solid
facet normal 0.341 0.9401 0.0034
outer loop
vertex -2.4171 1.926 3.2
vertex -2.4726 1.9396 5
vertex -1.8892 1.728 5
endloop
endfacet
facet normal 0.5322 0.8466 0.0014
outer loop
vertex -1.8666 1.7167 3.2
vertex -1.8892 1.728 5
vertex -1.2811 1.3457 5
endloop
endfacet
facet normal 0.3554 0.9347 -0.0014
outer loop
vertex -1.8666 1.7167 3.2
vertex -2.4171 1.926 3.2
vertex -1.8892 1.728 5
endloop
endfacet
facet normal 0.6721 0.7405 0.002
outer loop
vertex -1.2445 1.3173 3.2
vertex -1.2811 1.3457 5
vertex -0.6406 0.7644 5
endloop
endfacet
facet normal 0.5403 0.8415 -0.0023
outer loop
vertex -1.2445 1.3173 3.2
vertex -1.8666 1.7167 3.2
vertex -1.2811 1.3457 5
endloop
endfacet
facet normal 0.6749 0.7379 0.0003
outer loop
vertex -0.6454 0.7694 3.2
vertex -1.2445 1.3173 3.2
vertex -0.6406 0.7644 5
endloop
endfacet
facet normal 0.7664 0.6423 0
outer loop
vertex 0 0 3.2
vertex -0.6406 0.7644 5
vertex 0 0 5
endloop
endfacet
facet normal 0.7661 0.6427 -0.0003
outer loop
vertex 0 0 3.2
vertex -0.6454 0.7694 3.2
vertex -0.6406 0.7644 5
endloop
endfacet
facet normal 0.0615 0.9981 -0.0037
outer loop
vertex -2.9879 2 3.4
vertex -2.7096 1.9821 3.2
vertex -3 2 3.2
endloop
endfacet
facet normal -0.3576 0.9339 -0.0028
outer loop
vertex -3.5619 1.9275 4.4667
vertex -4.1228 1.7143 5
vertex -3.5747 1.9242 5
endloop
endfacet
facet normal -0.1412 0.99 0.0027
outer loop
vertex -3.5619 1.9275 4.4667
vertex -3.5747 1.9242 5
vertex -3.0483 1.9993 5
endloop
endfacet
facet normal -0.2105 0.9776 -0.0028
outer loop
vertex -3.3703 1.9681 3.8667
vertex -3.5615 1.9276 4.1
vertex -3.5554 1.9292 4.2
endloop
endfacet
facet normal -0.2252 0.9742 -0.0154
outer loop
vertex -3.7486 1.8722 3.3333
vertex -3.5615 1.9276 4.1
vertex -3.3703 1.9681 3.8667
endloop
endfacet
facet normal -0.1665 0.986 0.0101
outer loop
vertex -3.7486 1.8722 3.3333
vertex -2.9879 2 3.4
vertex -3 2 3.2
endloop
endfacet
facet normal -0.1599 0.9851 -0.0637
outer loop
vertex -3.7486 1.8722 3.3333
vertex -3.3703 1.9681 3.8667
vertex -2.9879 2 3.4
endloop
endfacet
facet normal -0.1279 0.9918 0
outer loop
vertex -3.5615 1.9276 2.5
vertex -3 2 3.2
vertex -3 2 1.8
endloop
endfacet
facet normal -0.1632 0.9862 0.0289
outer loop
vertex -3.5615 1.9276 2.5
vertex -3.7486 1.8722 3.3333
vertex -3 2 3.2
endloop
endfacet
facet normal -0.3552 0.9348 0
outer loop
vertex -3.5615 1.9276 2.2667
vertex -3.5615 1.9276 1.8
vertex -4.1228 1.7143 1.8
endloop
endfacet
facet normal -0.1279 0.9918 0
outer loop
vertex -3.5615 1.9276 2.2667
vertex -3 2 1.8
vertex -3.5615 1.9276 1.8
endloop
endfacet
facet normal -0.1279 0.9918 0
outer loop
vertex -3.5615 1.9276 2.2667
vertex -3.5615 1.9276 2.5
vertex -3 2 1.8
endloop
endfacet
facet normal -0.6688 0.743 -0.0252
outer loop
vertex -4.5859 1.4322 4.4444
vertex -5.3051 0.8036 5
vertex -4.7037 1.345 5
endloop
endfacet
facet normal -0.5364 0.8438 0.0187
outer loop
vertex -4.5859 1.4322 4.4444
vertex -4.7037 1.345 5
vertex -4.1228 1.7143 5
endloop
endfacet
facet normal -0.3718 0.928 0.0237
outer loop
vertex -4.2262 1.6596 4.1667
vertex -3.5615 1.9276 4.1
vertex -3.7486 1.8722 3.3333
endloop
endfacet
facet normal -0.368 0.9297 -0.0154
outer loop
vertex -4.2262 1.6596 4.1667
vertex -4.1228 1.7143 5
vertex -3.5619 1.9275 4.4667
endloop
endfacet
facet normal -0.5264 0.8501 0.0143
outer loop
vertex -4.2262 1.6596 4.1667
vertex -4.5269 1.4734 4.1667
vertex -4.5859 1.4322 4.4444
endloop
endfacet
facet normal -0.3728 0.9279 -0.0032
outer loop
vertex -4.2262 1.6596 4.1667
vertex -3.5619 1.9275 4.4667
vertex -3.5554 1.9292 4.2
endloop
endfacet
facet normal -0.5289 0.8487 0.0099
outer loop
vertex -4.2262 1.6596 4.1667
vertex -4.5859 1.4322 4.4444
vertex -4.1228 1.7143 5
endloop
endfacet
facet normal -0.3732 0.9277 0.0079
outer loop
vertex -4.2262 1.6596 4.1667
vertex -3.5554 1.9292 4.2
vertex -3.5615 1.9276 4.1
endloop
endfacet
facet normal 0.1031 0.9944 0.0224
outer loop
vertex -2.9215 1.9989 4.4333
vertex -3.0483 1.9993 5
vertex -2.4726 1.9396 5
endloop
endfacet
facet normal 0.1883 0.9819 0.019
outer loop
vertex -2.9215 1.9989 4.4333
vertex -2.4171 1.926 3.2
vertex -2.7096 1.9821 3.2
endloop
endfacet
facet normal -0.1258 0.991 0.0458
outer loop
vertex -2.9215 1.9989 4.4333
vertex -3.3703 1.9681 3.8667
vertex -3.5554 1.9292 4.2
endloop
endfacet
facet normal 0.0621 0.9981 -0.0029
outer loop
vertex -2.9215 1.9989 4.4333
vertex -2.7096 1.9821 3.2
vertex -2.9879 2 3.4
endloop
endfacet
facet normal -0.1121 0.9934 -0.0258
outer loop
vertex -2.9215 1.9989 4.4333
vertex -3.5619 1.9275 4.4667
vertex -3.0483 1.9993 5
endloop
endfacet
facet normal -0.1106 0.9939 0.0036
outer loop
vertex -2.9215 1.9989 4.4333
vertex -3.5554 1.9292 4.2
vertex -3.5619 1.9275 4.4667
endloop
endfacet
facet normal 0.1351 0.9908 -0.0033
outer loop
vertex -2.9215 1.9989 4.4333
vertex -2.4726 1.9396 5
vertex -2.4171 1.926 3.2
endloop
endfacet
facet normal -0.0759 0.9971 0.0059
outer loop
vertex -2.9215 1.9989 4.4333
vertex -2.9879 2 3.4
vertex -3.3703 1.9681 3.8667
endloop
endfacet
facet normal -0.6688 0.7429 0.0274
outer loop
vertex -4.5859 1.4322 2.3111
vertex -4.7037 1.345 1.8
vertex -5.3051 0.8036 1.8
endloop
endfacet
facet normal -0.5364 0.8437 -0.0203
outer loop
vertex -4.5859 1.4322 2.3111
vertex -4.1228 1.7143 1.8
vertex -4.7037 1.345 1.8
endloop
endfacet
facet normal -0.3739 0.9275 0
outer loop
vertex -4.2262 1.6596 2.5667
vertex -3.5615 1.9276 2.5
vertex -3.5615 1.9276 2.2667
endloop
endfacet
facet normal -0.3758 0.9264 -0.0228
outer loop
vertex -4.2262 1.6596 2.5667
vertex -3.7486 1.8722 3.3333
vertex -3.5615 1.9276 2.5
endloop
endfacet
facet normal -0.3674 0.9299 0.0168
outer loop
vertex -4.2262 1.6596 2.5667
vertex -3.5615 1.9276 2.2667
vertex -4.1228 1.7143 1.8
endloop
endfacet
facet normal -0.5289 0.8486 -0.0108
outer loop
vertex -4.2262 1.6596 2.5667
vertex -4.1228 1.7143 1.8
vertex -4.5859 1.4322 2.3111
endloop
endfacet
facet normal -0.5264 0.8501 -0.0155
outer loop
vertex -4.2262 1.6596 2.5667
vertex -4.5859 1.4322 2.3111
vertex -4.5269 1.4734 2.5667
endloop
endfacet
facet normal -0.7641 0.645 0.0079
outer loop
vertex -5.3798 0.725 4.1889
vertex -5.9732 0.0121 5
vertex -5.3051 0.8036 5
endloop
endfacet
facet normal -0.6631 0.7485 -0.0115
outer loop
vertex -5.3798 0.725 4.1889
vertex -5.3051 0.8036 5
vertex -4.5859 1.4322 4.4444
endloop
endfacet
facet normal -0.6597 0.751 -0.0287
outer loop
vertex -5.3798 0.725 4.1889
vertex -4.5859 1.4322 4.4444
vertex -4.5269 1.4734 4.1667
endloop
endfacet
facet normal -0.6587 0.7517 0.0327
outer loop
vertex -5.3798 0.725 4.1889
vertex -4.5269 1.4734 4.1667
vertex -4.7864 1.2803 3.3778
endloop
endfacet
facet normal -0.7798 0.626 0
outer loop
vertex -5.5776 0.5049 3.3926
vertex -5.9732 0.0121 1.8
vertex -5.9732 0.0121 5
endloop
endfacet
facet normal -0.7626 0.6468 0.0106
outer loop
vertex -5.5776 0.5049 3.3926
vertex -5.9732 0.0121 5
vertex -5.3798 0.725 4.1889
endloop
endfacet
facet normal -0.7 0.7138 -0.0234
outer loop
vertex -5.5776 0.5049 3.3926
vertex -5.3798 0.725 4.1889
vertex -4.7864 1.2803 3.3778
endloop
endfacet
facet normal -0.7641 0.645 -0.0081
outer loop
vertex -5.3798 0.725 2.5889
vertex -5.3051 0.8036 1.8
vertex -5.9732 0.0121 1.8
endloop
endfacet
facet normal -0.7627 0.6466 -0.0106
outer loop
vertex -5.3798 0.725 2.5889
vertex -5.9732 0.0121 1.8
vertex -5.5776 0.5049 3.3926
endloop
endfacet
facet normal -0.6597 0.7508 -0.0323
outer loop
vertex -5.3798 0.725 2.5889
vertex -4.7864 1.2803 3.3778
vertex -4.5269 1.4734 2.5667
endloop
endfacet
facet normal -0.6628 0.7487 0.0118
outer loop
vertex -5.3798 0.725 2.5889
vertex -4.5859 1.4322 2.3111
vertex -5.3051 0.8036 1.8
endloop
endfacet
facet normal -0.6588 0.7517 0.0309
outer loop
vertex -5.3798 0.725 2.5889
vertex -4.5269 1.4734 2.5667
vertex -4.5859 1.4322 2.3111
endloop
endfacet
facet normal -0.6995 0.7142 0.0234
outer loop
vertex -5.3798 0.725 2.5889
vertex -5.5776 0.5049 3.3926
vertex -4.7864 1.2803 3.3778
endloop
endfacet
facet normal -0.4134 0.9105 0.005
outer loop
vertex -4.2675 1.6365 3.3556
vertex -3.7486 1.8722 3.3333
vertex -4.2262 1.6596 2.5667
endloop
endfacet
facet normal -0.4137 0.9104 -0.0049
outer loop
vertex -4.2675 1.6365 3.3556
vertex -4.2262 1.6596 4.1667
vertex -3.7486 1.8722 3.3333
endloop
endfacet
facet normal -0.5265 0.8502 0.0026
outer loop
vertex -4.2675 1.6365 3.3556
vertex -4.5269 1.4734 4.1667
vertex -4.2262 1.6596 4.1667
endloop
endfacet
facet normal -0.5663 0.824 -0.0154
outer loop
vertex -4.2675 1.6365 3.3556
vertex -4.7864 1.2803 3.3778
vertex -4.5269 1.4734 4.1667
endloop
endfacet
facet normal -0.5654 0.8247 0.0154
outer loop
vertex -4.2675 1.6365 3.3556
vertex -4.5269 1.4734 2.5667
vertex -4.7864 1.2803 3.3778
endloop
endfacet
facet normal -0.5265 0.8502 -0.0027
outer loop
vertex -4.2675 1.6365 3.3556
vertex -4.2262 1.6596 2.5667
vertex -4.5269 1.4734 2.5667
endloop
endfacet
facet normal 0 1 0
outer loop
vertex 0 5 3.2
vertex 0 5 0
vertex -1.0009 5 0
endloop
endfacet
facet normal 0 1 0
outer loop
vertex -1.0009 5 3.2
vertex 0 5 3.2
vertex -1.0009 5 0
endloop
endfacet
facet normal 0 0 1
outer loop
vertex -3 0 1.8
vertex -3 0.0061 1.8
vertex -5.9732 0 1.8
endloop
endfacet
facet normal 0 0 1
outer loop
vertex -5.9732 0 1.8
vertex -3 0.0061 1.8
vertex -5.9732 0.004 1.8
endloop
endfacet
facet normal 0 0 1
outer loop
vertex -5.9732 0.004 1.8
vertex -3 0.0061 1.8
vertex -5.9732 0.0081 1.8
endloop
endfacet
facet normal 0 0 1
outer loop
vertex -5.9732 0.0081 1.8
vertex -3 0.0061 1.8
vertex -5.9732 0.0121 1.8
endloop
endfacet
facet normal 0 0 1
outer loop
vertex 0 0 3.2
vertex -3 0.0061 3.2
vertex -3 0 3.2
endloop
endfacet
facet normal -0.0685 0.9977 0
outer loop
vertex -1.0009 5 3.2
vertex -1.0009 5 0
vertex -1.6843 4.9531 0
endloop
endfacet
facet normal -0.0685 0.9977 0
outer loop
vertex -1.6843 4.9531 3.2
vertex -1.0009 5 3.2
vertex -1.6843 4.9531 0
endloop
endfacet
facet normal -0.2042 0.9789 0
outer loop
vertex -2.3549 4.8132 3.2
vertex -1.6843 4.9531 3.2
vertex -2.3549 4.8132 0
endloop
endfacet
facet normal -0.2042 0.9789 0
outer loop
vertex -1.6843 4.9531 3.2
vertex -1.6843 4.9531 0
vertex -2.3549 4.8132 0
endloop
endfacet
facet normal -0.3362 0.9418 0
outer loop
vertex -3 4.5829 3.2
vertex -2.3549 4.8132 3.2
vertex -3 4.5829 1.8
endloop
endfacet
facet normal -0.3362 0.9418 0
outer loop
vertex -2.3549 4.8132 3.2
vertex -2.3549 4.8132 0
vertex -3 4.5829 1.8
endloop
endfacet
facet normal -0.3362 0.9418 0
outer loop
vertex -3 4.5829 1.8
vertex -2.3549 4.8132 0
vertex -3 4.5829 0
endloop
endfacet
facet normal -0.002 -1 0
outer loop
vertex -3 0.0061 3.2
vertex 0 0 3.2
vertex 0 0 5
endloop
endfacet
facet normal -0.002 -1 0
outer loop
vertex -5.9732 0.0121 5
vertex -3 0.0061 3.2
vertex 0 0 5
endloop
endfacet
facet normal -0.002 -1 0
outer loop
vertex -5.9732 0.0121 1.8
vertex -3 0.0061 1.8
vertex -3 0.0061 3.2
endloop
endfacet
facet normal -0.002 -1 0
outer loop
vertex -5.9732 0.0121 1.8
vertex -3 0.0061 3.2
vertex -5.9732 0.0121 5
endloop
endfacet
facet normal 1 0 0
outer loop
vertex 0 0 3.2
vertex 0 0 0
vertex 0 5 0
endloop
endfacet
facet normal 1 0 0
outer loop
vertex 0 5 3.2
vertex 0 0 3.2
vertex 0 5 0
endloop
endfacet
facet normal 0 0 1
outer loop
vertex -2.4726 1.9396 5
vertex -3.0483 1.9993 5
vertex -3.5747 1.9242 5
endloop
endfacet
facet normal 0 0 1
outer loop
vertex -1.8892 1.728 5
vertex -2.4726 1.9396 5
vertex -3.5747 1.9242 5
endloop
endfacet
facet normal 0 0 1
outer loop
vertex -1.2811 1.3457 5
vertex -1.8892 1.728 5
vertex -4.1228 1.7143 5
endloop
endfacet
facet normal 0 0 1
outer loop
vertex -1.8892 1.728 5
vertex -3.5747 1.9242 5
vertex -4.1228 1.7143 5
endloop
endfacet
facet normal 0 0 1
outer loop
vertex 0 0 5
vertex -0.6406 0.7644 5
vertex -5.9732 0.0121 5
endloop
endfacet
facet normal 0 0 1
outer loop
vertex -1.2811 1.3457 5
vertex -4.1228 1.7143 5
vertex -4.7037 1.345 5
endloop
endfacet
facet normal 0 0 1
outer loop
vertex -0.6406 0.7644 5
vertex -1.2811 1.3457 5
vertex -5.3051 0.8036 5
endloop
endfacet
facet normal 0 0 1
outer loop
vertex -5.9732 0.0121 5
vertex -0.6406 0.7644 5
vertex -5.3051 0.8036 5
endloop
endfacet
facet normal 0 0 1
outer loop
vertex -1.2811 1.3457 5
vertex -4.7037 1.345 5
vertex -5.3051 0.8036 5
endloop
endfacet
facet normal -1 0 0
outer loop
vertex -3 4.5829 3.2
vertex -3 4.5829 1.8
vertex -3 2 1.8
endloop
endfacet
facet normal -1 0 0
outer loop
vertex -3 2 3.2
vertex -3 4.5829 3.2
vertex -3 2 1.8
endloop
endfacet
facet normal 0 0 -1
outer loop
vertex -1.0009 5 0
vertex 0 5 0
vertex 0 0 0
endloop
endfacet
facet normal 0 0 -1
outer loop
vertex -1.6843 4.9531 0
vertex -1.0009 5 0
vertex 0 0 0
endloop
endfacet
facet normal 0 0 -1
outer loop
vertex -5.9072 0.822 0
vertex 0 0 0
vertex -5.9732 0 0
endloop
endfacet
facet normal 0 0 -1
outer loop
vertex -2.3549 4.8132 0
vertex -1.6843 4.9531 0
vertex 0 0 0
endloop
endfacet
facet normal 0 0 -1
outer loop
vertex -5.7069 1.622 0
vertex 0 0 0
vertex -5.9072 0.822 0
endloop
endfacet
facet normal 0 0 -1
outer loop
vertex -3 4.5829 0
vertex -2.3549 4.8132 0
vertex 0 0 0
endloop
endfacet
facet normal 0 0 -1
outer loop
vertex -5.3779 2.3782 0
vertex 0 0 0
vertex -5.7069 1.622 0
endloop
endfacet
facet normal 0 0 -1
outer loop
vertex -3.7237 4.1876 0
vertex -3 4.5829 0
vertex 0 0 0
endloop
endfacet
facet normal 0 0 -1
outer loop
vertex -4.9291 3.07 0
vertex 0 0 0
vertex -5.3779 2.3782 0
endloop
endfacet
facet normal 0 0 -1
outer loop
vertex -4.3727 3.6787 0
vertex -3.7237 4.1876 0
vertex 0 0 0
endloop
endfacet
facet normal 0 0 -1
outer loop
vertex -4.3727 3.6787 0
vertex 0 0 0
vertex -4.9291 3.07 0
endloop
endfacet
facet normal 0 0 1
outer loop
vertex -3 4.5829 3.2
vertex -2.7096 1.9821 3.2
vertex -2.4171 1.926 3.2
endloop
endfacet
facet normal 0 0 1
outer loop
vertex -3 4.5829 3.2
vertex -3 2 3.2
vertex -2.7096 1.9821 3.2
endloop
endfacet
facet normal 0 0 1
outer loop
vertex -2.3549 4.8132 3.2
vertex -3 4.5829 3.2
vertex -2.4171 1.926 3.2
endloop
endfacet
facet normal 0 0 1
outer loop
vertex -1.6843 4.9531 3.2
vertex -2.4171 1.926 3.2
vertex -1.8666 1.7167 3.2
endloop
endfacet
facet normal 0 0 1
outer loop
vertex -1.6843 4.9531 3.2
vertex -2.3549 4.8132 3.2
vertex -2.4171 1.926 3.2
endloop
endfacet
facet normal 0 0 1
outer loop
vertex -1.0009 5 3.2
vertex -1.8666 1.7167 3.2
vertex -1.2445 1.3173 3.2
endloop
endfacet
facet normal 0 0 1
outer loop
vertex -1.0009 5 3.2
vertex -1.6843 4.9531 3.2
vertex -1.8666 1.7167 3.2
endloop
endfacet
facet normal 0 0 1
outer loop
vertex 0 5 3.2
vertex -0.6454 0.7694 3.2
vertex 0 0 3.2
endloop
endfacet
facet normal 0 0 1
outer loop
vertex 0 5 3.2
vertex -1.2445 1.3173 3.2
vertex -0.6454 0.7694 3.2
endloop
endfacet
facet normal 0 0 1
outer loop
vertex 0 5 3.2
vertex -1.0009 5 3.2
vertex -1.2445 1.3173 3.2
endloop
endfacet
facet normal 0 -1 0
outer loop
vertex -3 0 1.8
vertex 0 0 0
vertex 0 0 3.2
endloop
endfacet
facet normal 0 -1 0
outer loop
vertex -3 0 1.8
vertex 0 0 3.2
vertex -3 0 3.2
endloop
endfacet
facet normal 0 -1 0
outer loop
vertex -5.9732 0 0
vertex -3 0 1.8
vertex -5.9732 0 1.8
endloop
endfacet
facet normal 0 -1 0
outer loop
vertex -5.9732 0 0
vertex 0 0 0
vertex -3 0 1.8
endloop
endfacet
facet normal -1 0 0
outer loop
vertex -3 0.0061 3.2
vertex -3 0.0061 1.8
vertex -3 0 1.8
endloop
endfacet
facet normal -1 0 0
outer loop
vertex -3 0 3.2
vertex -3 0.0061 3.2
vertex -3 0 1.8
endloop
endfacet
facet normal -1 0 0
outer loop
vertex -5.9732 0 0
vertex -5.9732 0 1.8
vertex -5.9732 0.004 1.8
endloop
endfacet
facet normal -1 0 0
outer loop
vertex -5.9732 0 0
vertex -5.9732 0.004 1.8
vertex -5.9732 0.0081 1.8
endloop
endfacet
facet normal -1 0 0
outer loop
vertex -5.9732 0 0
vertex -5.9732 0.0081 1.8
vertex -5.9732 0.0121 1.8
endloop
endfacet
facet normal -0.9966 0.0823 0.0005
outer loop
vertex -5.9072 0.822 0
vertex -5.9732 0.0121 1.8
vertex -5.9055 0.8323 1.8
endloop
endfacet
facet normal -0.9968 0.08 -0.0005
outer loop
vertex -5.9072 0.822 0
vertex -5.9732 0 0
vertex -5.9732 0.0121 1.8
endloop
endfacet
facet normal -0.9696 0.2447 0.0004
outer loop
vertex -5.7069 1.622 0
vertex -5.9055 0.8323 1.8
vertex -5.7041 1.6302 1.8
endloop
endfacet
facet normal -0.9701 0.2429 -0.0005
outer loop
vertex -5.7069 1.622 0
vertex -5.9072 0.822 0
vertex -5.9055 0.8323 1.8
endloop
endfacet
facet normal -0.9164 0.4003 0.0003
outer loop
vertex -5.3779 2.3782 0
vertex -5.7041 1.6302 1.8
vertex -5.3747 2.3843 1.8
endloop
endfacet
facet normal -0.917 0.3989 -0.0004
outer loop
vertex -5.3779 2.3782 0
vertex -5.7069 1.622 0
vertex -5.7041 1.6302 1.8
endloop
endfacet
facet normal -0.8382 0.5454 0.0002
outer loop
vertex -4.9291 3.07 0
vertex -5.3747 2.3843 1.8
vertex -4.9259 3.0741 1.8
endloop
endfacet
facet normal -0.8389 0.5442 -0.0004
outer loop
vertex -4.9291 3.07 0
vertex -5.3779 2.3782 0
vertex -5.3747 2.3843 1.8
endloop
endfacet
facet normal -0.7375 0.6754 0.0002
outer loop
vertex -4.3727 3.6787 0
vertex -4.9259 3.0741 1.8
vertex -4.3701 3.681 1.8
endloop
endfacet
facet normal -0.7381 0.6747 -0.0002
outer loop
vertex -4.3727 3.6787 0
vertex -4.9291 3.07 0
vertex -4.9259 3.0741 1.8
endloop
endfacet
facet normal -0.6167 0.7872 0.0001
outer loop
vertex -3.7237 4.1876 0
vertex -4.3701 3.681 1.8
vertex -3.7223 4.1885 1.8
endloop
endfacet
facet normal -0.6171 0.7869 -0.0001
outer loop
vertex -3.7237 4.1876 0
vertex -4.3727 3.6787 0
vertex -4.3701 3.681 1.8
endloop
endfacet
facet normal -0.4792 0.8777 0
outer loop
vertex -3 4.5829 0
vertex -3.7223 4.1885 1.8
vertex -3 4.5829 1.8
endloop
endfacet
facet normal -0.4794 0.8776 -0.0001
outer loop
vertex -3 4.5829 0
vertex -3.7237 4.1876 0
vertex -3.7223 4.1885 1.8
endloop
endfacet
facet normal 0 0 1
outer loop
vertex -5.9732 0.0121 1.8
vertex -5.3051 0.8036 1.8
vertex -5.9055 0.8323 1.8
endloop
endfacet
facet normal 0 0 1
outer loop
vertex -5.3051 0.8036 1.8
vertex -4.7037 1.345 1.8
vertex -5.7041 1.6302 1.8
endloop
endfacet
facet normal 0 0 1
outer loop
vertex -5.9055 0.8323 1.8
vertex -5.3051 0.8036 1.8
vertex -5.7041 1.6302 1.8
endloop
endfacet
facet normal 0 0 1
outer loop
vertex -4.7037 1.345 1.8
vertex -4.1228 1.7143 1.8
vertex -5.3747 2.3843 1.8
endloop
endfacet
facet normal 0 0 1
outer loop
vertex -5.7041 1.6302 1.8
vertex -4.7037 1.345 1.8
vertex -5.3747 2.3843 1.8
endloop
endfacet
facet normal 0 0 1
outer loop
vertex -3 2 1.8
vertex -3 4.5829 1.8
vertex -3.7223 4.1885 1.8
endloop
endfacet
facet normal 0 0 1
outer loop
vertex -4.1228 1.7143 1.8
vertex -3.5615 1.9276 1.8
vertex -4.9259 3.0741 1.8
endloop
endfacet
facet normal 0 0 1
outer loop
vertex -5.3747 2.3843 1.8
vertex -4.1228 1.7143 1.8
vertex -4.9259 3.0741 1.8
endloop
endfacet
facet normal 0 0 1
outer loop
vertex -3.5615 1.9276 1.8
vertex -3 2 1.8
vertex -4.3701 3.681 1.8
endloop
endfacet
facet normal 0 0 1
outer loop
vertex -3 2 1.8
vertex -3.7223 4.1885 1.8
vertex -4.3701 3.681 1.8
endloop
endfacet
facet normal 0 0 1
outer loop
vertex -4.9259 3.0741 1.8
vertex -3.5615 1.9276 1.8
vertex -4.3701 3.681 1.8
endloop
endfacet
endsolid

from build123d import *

# Parameters (mm, degrees)
BOSS_EXTRUDE1_DEPTH = 3.2
BOSS_EXTRUDE2_DEPTH = 1.8
BOSS_EXTRUDE3_DEPTH = 3.2


with BuildPart() as part:
    # Sketch1 → Boss-Extrude1 (new body)
    with BuildSketch(Plane.XY):
        with BuildLine():
            Line((-3, 4.582902076), (-3, 0))
            Line((-3, 0), (0, 0))
            Line((0, 0), (0, 5))
            Line((0, 5), (-1.00094518, 5))
            ThreePointArc((-1.00094518, 5), (-2.021997437, 4.894614703), (-3, 4.582902076))
        make_face()
    extrude(amount=BOSS_EXTRUDE1_DEPTH)

    # Sketch2 → Boss-Extrude2 (add)
    with BuildSketch(Plane(origin=(0, 0, 0), x_dir=(-1, 0, 0), z_dir=(0, 0, -1))):
        with BuildLine():
            Line((3, 0), (5.973192614, 0))
            ThreePointArc((5.973192614, 0), (5.167805035, 2.733390386), (3, 4.582902076))
            Line((3, 4.582902076), (3, 0))
        make_face()
    extrude(amount=-BOSS_EXTRUDE2_DEPTH)

    # Sketch3 → Boss-Extrude3 (add)
    with BuildSketch(Plane.XY.offset(1.8)):
        with BuildLine():
            Line((0, 0), (-5.973207287, 0.012113161))
            add(Edge.make_bspline(
                [(-5.973207287, 0.012113161), (-2.989270297, 3.993959552), (0, 0)],
                knots=[0, 0, 0, 1, 1, 1], degree=2))
        make_face()
    extrude(amount=BOSS_EXTRUDE3_DEPTH)


solid = part.part
